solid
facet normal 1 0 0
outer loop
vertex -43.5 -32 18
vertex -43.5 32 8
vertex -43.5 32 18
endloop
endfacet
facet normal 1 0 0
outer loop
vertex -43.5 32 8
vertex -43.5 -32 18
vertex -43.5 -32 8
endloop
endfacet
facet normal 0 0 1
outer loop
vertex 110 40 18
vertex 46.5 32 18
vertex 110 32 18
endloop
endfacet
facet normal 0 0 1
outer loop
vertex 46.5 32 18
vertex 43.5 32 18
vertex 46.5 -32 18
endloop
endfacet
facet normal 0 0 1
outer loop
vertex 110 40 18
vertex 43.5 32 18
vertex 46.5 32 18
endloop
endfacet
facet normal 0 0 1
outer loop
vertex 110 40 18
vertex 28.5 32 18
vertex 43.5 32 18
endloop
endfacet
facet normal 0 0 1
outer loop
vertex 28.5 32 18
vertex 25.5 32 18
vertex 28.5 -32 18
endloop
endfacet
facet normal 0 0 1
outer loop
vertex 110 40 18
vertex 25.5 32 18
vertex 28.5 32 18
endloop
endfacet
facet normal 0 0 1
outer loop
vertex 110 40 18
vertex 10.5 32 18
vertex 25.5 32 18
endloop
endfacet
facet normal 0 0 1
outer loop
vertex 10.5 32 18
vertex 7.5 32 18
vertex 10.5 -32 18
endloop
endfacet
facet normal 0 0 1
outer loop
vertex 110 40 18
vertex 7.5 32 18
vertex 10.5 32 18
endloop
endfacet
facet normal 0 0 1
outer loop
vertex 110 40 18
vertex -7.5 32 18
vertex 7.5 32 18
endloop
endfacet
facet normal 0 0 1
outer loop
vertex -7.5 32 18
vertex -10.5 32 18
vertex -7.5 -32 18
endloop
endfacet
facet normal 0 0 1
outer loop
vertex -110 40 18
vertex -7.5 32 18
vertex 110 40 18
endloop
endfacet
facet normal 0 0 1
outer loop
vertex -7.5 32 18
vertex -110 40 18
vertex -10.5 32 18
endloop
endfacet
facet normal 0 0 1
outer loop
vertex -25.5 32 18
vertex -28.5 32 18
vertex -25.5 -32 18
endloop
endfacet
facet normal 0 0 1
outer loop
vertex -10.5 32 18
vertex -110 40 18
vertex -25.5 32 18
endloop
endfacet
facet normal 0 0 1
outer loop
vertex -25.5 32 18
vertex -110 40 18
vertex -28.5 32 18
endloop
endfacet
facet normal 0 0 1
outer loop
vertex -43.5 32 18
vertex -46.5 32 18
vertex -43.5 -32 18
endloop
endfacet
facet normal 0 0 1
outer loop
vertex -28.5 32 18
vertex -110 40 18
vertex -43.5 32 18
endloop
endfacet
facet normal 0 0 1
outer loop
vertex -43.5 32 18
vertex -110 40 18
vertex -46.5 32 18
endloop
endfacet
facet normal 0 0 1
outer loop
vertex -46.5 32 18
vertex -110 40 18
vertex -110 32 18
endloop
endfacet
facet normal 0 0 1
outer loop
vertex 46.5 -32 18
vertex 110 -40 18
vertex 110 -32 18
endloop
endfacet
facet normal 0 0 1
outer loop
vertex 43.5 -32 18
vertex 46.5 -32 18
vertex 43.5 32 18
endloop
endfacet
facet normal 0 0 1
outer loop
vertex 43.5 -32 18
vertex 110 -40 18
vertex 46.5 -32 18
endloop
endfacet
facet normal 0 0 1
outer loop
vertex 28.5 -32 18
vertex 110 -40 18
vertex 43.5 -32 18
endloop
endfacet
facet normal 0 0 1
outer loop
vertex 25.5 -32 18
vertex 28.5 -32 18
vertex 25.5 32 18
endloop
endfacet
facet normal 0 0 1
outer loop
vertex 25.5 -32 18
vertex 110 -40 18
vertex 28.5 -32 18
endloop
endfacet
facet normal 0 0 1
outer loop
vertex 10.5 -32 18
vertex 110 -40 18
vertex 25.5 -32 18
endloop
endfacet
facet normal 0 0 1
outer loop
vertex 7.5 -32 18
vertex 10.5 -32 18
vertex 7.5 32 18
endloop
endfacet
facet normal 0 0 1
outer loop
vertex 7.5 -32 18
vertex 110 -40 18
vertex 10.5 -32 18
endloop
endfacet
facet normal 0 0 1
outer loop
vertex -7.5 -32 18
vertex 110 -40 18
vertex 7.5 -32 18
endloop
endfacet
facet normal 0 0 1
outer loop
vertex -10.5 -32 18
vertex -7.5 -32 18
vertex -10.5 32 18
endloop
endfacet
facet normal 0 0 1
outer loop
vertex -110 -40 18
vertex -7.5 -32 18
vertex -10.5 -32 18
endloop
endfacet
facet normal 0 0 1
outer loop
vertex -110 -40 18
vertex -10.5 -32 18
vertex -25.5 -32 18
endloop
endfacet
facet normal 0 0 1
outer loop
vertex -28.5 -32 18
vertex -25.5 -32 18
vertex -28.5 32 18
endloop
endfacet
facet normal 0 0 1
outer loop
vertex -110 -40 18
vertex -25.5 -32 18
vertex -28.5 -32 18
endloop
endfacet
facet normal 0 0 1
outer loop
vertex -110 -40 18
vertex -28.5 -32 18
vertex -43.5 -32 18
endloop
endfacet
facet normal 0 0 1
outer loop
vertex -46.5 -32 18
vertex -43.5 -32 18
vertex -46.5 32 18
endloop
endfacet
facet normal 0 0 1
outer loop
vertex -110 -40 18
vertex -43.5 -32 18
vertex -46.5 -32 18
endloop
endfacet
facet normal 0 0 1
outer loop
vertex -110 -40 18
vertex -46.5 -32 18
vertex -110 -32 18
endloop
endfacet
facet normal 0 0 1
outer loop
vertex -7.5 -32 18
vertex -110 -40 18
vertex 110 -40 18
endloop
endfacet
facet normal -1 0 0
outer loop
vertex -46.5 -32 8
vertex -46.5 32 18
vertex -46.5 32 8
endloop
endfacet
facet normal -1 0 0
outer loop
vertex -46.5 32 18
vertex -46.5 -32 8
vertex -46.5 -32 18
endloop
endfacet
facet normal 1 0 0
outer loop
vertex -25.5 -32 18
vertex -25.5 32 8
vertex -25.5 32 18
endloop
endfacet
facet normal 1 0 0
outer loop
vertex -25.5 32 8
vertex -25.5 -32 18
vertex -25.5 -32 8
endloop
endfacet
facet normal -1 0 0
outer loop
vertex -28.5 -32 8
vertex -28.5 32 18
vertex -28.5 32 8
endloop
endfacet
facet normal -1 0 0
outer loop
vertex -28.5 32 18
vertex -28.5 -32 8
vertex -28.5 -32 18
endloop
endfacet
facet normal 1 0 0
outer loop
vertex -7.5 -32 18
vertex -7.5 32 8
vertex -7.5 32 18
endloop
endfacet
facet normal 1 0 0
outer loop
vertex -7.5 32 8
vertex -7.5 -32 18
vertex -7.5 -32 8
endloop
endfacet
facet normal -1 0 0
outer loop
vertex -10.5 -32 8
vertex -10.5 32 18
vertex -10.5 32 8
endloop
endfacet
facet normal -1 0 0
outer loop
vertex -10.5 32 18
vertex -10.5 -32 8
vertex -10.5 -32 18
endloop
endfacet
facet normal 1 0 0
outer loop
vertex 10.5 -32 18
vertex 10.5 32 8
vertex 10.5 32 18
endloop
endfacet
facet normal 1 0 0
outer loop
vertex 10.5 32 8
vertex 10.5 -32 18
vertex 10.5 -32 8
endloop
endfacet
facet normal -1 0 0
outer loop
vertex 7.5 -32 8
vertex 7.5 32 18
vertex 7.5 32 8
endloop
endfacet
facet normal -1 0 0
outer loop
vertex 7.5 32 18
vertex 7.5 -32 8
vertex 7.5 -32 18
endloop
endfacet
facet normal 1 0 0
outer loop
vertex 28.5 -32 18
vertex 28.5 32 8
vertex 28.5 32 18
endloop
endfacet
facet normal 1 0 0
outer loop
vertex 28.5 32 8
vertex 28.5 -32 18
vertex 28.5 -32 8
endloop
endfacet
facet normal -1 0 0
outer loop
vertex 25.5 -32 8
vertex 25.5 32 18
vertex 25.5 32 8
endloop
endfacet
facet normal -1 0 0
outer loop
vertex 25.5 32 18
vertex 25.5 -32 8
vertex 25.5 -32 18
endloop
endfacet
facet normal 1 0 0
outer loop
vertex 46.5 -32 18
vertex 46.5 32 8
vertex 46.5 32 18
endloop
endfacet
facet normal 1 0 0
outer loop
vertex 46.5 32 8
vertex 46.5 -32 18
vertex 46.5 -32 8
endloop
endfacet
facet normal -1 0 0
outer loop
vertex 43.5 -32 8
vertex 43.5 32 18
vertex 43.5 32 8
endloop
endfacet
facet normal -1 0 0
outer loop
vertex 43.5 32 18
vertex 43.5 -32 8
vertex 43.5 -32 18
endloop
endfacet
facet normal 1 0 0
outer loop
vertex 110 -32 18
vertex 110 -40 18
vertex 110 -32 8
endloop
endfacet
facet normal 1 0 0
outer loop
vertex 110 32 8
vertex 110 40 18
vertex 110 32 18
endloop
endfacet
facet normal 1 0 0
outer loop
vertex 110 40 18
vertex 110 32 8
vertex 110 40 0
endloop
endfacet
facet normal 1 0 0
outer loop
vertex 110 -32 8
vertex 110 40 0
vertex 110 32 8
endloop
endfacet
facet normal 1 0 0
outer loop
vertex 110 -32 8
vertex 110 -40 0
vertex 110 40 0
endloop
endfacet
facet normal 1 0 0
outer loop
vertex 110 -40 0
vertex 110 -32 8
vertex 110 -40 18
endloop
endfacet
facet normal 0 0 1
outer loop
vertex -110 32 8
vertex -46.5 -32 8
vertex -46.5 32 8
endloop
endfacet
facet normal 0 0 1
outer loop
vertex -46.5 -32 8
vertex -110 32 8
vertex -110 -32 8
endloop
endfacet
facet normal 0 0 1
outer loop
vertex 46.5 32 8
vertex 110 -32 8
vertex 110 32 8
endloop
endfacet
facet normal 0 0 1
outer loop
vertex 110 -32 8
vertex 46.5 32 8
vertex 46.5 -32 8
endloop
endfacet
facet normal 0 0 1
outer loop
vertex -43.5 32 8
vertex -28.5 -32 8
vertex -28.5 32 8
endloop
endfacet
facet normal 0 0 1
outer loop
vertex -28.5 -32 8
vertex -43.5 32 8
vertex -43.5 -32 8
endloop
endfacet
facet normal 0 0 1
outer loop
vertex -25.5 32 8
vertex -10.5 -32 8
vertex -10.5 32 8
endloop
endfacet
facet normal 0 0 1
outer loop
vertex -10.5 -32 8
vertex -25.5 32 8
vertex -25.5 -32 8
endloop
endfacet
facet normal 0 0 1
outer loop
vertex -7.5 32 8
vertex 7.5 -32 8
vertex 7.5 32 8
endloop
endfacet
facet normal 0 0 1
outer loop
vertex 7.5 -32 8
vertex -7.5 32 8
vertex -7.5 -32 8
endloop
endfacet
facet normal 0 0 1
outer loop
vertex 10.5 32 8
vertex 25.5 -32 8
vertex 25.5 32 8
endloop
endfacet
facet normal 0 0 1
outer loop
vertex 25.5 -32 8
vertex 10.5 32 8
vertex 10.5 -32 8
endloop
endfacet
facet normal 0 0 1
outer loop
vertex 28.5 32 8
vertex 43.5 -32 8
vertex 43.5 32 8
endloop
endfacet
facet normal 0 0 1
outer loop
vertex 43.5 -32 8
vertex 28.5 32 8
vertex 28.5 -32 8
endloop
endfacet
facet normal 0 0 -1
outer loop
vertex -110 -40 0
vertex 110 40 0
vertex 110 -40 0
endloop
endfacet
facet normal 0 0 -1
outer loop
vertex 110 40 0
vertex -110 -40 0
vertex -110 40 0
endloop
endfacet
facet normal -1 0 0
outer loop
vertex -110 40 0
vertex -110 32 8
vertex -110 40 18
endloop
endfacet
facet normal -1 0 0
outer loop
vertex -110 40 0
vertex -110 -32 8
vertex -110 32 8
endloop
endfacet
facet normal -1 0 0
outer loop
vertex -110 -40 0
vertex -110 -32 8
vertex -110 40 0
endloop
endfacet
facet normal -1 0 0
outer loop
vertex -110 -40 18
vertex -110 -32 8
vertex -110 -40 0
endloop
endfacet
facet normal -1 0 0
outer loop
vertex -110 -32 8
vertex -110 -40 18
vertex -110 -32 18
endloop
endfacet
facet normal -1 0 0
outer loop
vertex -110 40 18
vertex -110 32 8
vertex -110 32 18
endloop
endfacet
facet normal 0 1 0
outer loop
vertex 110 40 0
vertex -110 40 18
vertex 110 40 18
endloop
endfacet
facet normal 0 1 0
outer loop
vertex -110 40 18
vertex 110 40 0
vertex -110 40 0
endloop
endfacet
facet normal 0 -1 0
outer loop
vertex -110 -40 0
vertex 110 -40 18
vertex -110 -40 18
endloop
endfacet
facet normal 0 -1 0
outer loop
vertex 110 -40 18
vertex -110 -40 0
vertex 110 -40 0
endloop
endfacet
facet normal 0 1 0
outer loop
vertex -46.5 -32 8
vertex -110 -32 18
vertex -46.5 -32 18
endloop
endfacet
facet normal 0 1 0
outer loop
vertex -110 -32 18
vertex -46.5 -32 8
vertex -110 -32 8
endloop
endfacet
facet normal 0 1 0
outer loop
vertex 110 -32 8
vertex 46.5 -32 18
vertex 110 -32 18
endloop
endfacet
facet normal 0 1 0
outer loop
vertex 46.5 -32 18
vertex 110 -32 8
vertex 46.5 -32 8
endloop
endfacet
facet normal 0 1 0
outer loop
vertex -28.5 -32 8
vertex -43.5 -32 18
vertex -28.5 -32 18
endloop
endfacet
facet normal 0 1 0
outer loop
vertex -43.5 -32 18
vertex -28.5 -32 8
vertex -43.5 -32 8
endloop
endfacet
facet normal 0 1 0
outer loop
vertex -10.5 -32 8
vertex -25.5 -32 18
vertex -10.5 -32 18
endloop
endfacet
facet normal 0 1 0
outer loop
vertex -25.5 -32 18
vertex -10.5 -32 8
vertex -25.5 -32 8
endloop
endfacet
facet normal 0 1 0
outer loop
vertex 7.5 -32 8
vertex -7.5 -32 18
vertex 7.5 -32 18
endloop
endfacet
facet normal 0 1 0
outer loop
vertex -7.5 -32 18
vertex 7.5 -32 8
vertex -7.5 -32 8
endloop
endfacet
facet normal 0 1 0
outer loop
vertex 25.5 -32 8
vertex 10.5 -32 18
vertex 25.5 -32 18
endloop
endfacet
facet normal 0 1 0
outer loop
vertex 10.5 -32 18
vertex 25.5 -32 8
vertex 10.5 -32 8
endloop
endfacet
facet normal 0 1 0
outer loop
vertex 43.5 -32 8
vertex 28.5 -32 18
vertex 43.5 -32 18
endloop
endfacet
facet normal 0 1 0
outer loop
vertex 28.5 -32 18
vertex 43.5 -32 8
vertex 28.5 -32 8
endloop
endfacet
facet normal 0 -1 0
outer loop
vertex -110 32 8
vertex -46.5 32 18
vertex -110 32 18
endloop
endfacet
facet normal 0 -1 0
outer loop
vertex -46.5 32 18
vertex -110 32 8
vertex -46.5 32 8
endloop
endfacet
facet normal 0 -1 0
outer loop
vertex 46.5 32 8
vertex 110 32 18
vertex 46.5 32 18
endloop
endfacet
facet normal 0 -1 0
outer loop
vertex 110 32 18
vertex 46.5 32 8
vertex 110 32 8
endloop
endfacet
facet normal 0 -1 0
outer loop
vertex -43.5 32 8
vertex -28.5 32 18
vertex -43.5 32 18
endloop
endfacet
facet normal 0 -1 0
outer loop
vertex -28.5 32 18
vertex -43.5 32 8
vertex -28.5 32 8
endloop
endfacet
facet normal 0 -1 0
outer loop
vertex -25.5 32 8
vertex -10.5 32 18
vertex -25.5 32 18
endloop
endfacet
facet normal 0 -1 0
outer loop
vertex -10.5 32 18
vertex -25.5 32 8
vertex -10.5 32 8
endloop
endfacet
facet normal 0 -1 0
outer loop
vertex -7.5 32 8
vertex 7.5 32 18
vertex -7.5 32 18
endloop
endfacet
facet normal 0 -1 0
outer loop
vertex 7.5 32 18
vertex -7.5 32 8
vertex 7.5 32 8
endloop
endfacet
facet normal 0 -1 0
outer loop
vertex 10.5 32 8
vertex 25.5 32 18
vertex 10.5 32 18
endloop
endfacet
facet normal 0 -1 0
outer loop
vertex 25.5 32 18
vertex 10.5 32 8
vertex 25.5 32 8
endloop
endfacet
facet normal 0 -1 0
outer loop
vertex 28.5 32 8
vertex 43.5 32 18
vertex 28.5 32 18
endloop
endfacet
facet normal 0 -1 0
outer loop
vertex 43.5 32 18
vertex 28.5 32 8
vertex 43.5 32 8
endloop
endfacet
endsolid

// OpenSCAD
$fn = 32;

// ----------------------------------------------------------------------
// Rib frame 220 x 80 x 18
// 6 ribs at 18 mm pitch
// ----------------------------------------------------------------------

// --- parameters (mm) ---
frame = [220, 80, 8];  // base plate size (x, y, z)
rail_w = 8;            // side rail width
ribs = 6;              // number of ribs
rib_t = 3;             // rib thickness
rib_h = 10;            // rib height above the base plate
pitch = 18;            // pitch between rib centres

// --- derived feature positions (mm) ---
span = (ribs - 1) * pitch;          // = 90   distance between the outer ribs
origin_x = -span / 2;               // = -45   X of the first rib
rib_len = frame[1] - 2 * rail_w + 2;  // = 66   rib length, 1 mm into each rail
feature_centers = [
  [origin_x + 0 * pitch, 0],
  [origin_x + 1 * pitch, 0],
  [origin_x + 2 * pitch, 0],
  [origin_x + 3 * pitch, 0],
  [origin_x + 4 * pitch, 0],
  [origin_x + 5 * pitch, 0]
];   // rib centre line, drives the rib loop

// base plate, two side rails, then the ribs read straight off feature_centers
union() {
  translate([-frame[0] / 2, -frame[1] / 2, 0]) cube(frame);
  translate([-frame[0] / 2, -frame[1] / 2, 0]) cube([frame[0], rail_w, frame[2] + rib_h]);
  translate([-frame[0] / 2, frame[1] / 2 - rail_w, 0]) cube([frame[0], rail_w, frame[2] + rib_h]);
  for (centre = feature_centers)
    translate([centre[0] - rib_t / 2, centre[1] - rib_len / 2, frame[2] - 1])
      cube([rib_t, rib_len, rib_h + 1]);
}
